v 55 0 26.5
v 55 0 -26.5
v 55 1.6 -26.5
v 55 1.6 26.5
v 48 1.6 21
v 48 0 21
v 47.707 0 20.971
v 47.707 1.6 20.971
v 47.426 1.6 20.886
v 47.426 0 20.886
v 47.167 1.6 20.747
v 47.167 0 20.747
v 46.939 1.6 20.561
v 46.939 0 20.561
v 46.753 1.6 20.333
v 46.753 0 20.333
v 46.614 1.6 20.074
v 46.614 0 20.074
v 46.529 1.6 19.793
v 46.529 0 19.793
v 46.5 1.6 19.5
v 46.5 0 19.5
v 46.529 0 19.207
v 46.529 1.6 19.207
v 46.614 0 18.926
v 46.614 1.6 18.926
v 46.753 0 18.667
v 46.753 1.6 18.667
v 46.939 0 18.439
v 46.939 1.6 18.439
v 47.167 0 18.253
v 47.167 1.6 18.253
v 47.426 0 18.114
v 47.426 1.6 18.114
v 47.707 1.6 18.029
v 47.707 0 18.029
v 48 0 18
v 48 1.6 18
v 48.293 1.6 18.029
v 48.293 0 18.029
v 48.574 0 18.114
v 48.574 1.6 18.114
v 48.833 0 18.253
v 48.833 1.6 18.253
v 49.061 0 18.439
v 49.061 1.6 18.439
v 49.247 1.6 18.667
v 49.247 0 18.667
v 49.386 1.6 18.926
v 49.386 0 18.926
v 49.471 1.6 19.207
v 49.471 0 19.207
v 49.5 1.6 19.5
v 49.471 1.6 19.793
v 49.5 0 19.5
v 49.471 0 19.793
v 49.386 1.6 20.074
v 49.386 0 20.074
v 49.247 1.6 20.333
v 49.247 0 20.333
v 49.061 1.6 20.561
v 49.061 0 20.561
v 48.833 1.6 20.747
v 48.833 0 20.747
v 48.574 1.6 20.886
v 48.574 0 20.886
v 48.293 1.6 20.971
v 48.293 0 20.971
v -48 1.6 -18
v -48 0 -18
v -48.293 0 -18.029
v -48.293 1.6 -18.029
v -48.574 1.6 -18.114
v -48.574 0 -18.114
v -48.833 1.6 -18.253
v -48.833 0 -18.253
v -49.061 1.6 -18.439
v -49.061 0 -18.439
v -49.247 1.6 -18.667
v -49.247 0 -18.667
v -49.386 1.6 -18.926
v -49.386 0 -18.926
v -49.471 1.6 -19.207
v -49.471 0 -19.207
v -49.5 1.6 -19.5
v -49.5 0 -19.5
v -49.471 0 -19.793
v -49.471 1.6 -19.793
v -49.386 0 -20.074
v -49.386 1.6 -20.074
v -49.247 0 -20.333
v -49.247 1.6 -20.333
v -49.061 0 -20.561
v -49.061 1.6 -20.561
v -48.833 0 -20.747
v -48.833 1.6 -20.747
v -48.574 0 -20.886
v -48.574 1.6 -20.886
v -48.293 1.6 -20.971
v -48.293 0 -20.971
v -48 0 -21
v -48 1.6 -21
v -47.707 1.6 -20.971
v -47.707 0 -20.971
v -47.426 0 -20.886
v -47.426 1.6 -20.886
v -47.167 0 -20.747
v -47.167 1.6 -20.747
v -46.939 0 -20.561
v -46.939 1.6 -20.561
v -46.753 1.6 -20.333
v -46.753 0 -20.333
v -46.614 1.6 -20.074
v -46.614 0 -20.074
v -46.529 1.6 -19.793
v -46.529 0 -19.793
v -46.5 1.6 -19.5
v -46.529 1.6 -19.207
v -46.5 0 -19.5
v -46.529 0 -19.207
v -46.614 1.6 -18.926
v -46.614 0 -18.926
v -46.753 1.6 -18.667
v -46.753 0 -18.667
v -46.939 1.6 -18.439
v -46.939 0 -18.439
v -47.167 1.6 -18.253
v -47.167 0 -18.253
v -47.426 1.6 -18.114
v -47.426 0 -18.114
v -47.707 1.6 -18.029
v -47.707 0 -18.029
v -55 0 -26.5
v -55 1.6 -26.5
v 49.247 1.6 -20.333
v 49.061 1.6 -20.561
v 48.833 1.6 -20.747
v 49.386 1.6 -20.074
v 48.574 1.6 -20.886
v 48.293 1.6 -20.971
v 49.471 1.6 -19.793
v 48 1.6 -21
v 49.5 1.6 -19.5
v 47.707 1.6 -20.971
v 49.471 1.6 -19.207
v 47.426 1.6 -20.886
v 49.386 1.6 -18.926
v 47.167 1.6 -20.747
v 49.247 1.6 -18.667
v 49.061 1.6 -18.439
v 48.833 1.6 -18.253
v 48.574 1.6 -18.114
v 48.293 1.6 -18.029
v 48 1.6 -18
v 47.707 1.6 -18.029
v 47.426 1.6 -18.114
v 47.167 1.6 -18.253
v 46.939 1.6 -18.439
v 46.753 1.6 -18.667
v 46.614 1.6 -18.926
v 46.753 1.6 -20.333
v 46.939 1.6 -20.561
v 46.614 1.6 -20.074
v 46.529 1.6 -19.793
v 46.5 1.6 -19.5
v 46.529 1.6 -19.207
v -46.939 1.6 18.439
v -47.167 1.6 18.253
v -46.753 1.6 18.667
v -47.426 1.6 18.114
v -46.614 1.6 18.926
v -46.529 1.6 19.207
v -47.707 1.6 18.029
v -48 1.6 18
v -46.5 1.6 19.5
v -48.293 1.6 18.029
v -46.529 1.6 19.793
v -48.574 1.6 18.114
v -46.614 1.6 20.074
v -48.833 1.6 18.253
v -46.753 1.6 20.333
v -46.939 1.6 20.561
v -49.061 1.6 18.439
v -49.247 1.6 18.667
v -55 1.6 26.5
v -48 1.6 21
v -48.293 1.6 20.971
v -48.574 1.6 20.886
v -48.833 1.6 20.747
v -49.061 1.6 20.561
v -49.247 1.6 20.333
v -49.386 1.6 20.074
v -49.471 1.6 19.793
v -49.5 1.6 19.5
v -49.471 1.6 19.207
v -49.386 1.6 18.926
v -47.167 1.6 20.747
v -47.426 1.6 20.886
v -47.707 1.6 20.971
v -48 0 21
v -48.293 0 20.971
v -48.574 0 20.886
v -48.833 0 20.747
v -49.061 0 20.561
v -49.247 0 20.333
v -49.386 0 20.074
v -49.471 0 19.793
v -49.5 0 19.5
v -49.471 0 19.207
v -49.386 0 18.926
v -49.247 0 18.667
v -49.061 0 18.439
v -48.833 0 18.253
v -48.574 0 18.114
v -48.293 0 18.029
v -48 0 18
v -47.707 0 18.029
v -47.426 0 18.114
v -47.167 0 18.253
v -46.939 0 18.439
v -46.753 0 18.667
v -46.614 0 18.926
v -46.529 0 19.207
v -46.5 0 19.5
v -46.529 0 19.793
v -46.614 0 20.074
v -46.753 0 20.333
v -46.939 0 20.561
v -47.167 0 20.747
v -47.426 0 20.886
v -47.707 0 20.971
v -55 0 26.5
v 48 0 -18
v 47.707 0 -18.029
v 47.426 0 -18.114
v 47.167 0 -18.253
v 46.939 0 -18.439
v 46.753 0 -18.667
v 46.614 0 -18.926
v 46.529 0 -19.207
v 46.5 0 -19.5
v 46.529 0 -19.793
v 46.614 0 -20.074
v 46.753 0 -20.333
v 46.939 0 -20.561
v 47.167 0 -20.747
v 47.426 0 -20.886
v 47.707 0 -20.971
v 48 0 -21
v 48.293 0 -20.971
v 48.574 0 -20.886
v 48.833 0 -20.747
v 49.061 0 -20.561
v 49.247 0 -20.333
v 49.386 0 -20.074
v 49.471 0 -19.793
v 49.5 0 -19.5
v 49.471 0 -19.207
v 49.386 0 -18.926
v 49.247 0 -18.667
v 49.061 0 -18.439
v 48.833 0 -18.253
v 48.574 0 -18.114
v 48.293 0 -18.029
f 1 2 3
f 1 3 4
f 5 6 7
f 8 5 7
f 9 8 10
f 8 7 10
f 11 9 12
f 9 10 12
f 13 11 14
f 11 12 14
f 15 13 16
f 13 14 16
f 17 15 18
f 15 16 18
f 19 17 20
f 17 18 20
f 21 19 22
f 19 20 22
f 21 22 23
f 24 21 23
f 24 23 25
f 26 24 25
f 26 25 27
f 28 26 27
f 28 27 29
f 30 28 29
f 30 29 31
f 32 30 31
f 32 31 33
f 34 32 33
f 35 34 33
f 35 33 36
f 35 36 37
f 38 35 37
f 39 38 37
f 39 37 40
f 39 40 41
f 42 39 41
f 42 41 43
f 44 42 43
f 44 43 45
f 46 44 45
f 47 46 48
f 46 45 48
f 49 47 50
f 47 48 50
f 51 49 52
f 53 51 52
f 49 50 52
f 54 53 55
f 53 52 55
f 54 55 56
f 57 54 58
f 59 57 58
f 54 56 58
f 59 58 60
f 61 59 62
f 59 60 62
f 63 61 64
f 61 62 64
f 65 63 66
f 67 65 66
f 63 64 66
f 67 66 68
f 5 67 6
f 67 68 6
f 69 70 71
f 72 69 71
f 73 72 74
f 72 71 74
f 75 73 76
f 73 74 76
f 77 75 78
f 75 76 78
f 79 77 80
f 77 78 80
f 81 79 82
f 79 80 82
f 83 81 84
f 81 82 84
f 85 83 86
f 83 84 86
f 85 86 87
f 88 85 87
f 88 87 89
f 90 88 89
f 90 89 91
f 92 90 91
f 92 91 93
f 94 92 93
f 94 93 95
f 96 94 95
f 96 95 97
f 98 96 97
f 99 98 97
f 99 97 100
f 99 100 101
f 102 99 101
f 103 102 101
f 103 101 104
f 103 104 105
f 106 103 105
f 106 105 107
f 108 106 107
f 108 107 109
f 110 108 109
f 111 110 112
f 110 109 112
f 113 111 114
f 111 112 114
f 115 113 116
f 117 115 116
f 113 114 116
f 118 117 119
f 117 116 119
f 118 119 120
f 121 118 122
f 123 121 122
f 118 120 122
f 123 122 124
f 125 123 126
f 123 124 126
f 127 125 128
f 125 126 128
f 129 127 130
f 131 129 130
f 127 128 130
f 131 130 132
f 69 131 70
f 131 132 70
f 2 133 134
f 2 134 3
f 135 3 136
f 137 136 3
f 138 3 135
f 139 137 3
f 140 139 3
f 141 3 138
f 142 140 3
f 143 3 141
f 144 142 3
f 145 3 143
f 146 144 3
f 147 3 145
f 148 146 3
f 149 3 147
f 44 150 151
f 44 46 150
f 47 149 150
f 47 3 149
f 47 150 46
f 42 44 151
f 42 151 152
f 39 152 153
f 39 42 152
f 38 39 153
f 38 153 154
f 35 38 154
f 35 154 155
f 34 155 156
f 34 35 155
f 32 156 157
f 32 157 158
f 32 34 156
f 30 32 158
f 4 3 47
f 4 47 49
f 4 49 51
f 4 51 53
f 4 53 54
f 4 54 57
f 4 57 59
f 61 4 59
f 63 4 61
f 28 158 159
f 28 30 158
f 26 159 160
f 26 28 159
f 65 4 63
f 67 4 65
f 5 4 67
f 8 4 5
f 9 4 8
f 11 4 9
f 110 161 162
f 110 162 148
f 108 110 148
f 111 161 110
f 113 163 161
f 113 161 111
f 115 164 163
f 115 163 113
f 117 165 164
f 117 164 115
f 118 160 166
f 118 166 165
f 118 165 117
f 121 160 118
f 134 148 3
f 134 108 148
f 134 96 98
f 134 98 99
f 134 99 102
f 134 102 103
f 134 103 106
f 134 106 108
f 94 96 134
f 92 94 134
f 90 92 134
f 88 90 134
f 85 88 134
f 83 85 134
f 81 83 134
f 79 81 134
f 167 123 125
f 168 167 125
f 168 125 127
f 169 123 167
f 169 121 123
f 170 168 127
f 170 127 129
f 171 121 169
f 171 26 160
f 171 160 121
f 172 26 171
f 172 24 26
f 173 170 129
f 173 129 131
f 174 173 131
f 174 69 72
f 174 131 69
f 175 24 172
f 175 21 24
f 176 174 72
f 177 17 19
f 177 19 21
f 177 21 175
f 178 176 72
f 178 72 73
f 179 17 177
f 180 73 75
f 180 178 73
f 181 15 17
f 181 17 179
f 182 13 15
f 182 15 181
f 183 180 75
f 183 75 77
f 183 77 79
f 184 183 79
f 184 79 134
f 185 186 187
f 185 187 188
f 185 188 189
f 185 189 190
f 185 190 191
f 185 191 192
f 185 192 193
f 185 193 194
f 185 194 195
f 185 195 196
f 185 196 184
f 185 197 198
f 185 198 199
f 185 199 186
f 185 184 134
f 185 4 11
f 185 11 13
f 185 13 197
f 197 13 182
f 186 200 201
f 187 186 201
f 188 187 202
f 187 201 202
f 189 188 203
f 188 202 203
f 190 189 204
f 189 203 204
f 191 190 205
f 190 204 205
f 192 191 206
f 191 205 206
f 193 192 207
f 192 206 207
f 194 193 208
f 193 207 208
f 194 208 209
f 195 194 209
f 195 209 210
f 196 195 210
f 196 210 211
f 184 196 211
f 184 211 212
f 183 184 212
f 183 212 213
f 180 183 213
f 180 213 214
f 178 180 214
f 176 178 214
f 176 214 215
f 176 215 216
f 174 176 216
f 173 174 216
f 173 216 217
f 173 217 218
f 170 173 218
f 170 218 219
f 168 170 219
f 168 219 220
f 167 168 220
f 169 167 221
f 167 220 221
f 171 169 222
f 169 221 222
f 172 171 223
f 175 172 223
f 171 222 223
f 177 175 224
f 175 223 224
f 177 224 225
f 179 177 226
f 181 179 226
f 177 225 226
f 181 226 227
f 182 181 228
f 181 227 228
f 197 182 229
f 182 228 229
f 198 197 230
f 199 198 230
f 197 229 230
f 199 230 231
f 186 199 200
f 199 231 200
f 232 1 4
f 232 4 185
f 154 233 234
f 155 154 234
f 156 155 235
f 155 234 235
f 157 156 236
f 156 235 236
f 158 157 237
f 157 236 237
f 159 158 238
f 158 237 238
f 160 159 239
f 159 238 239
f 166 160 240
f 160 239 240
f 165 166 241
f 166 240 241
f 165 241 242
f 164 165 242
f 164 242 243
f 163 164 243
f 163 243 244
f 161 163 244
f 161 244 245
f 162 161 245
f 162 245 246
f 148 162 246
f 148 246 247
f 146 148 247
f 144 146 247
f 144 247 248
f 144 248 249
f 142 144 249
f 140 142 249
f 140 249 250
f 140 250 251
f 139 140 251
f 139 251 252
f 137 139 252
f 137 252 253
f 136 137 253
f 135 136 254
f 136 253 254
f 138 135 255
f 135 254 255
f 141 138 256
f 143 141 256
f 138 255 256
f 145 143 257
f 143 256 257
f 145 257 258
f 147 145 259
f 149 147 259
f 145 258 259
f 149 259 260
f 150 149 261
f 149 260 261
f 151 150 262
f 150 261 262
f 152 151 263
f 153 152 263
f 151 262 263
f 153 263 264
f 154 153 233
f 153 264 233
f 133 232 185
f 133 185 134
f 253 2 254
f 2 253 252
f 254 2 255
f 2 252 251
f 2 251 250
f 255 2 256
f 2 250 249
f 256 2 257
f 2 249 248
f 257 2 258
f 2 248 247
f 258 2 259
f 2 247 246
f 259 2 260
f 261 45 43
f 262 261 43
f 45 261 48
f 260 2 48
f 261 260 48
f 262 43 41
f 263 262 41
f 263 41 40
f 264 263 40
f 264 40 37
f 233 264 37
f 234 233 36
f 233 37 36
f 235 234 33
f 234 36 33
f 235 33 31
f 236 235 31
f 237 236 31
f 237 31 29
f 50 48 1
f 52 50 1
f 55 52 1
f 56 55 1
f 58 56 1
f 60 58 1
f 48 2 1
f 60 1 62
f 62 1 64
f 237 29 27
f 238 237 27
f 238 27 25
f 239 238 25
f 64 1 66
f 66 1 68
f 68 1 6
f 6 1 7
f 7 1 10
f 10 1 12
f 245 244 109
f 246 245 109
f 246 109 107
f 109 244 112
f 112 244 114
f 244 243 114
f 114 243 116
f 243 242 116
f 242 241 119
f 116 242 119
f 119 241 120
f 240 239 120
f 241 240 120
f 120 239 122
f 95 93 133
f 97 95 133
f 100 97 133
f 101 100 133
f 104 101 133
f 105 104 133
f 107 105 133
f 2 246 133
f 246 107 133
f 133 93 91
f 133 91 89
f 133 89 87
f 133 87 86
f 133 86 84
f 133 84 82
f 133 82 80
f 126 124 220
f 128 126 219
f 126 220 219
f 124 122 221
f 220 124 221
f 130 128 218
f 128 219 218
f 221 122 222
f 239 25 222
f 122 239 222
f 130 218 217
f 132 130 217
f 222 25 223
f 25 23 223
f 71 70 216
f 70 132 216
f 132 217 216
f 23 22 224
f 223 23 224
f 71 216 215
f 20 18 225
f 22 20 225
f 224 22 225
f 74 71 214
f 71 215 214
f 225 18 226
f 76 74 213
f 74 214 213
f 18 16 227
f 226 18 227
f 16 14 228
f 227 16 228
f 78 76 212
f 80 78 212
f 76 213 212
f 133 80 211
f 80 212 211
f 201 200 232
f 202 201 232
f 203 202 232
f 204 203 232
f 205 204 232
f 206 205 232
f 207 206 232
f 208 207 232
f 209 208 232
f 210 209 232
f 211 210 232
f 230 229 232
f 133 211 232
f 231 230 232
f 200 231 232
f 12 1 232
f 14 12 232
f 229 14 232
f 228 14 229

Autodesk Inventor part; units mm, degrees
ref_plane "YZ Plane" through (0, 0, 0) normal (1, 0, 0) x (0, 1, 0)
ref_plane "XZ Plane" through (0, 0, 0) normal (0, 1, 0) x (-1, 0, 0)
ref_plane "XY Plane" through (0, 0, 0) normal (0, 0, 1) x (1, 0, 0)
sketch "Sketch1" plane through (0, 0, 0) normal (0, 1, 0) x (-1, 0, 0)
  line L0 (55, -26.5) -> (-55, -26.5)
  line L1 (-55, -26.5) -> (-55, 26.5)
  line L2 (-55, 26.5) -> (55, 26.5)
  line L3 (55, 26.5) -> (55, -26.5)
  point P0 (0, 0)
  point P1 (0, -26.5)
  point P2 (55, 0)
  dimension "d0" = 53
  dimension "d1" = 110
extrude "Extrusion1" add sketch "Sketch1" along normal blind 1.6
sketch "Sketch2" plane through (0, 1.6, 0) normal (0, 1, 0) x (1, 0, 0)
  line L0 (55, 26.5) -> (-55, 26.5) projected
  line L1 (-55, 26.5) -> (-55, -26.5) projected
  line L2 (-55, -26.5) -> (55, -26.5) projected
  line L3 (55, -26.5) -> (55, 26.5) projected
  point P0 (0, 0)
  point P1 (-48, -19.5)
  point P2 (-48, 19.5)
  point P3 (48, -19.5)
  point P4 (48, 19.5)
  dimension "d4" = 7
  dimension "d5" = 7
  dimension "d6" = 7
  dimension "d7" = 7
hole "Hole1" at (-48, 1.6, 19.5) at (-48, 1.6, -19.5) at (48, 1.6, 19.5) at (48, 1.6, -19.5) direction (0, -1, 0) diameter 3 end through all
equation "\"d5\" = d4"
equation "\"d6\" = d4"
equation "\"d7\" = d4"
properties part number "Heater_pcb"
